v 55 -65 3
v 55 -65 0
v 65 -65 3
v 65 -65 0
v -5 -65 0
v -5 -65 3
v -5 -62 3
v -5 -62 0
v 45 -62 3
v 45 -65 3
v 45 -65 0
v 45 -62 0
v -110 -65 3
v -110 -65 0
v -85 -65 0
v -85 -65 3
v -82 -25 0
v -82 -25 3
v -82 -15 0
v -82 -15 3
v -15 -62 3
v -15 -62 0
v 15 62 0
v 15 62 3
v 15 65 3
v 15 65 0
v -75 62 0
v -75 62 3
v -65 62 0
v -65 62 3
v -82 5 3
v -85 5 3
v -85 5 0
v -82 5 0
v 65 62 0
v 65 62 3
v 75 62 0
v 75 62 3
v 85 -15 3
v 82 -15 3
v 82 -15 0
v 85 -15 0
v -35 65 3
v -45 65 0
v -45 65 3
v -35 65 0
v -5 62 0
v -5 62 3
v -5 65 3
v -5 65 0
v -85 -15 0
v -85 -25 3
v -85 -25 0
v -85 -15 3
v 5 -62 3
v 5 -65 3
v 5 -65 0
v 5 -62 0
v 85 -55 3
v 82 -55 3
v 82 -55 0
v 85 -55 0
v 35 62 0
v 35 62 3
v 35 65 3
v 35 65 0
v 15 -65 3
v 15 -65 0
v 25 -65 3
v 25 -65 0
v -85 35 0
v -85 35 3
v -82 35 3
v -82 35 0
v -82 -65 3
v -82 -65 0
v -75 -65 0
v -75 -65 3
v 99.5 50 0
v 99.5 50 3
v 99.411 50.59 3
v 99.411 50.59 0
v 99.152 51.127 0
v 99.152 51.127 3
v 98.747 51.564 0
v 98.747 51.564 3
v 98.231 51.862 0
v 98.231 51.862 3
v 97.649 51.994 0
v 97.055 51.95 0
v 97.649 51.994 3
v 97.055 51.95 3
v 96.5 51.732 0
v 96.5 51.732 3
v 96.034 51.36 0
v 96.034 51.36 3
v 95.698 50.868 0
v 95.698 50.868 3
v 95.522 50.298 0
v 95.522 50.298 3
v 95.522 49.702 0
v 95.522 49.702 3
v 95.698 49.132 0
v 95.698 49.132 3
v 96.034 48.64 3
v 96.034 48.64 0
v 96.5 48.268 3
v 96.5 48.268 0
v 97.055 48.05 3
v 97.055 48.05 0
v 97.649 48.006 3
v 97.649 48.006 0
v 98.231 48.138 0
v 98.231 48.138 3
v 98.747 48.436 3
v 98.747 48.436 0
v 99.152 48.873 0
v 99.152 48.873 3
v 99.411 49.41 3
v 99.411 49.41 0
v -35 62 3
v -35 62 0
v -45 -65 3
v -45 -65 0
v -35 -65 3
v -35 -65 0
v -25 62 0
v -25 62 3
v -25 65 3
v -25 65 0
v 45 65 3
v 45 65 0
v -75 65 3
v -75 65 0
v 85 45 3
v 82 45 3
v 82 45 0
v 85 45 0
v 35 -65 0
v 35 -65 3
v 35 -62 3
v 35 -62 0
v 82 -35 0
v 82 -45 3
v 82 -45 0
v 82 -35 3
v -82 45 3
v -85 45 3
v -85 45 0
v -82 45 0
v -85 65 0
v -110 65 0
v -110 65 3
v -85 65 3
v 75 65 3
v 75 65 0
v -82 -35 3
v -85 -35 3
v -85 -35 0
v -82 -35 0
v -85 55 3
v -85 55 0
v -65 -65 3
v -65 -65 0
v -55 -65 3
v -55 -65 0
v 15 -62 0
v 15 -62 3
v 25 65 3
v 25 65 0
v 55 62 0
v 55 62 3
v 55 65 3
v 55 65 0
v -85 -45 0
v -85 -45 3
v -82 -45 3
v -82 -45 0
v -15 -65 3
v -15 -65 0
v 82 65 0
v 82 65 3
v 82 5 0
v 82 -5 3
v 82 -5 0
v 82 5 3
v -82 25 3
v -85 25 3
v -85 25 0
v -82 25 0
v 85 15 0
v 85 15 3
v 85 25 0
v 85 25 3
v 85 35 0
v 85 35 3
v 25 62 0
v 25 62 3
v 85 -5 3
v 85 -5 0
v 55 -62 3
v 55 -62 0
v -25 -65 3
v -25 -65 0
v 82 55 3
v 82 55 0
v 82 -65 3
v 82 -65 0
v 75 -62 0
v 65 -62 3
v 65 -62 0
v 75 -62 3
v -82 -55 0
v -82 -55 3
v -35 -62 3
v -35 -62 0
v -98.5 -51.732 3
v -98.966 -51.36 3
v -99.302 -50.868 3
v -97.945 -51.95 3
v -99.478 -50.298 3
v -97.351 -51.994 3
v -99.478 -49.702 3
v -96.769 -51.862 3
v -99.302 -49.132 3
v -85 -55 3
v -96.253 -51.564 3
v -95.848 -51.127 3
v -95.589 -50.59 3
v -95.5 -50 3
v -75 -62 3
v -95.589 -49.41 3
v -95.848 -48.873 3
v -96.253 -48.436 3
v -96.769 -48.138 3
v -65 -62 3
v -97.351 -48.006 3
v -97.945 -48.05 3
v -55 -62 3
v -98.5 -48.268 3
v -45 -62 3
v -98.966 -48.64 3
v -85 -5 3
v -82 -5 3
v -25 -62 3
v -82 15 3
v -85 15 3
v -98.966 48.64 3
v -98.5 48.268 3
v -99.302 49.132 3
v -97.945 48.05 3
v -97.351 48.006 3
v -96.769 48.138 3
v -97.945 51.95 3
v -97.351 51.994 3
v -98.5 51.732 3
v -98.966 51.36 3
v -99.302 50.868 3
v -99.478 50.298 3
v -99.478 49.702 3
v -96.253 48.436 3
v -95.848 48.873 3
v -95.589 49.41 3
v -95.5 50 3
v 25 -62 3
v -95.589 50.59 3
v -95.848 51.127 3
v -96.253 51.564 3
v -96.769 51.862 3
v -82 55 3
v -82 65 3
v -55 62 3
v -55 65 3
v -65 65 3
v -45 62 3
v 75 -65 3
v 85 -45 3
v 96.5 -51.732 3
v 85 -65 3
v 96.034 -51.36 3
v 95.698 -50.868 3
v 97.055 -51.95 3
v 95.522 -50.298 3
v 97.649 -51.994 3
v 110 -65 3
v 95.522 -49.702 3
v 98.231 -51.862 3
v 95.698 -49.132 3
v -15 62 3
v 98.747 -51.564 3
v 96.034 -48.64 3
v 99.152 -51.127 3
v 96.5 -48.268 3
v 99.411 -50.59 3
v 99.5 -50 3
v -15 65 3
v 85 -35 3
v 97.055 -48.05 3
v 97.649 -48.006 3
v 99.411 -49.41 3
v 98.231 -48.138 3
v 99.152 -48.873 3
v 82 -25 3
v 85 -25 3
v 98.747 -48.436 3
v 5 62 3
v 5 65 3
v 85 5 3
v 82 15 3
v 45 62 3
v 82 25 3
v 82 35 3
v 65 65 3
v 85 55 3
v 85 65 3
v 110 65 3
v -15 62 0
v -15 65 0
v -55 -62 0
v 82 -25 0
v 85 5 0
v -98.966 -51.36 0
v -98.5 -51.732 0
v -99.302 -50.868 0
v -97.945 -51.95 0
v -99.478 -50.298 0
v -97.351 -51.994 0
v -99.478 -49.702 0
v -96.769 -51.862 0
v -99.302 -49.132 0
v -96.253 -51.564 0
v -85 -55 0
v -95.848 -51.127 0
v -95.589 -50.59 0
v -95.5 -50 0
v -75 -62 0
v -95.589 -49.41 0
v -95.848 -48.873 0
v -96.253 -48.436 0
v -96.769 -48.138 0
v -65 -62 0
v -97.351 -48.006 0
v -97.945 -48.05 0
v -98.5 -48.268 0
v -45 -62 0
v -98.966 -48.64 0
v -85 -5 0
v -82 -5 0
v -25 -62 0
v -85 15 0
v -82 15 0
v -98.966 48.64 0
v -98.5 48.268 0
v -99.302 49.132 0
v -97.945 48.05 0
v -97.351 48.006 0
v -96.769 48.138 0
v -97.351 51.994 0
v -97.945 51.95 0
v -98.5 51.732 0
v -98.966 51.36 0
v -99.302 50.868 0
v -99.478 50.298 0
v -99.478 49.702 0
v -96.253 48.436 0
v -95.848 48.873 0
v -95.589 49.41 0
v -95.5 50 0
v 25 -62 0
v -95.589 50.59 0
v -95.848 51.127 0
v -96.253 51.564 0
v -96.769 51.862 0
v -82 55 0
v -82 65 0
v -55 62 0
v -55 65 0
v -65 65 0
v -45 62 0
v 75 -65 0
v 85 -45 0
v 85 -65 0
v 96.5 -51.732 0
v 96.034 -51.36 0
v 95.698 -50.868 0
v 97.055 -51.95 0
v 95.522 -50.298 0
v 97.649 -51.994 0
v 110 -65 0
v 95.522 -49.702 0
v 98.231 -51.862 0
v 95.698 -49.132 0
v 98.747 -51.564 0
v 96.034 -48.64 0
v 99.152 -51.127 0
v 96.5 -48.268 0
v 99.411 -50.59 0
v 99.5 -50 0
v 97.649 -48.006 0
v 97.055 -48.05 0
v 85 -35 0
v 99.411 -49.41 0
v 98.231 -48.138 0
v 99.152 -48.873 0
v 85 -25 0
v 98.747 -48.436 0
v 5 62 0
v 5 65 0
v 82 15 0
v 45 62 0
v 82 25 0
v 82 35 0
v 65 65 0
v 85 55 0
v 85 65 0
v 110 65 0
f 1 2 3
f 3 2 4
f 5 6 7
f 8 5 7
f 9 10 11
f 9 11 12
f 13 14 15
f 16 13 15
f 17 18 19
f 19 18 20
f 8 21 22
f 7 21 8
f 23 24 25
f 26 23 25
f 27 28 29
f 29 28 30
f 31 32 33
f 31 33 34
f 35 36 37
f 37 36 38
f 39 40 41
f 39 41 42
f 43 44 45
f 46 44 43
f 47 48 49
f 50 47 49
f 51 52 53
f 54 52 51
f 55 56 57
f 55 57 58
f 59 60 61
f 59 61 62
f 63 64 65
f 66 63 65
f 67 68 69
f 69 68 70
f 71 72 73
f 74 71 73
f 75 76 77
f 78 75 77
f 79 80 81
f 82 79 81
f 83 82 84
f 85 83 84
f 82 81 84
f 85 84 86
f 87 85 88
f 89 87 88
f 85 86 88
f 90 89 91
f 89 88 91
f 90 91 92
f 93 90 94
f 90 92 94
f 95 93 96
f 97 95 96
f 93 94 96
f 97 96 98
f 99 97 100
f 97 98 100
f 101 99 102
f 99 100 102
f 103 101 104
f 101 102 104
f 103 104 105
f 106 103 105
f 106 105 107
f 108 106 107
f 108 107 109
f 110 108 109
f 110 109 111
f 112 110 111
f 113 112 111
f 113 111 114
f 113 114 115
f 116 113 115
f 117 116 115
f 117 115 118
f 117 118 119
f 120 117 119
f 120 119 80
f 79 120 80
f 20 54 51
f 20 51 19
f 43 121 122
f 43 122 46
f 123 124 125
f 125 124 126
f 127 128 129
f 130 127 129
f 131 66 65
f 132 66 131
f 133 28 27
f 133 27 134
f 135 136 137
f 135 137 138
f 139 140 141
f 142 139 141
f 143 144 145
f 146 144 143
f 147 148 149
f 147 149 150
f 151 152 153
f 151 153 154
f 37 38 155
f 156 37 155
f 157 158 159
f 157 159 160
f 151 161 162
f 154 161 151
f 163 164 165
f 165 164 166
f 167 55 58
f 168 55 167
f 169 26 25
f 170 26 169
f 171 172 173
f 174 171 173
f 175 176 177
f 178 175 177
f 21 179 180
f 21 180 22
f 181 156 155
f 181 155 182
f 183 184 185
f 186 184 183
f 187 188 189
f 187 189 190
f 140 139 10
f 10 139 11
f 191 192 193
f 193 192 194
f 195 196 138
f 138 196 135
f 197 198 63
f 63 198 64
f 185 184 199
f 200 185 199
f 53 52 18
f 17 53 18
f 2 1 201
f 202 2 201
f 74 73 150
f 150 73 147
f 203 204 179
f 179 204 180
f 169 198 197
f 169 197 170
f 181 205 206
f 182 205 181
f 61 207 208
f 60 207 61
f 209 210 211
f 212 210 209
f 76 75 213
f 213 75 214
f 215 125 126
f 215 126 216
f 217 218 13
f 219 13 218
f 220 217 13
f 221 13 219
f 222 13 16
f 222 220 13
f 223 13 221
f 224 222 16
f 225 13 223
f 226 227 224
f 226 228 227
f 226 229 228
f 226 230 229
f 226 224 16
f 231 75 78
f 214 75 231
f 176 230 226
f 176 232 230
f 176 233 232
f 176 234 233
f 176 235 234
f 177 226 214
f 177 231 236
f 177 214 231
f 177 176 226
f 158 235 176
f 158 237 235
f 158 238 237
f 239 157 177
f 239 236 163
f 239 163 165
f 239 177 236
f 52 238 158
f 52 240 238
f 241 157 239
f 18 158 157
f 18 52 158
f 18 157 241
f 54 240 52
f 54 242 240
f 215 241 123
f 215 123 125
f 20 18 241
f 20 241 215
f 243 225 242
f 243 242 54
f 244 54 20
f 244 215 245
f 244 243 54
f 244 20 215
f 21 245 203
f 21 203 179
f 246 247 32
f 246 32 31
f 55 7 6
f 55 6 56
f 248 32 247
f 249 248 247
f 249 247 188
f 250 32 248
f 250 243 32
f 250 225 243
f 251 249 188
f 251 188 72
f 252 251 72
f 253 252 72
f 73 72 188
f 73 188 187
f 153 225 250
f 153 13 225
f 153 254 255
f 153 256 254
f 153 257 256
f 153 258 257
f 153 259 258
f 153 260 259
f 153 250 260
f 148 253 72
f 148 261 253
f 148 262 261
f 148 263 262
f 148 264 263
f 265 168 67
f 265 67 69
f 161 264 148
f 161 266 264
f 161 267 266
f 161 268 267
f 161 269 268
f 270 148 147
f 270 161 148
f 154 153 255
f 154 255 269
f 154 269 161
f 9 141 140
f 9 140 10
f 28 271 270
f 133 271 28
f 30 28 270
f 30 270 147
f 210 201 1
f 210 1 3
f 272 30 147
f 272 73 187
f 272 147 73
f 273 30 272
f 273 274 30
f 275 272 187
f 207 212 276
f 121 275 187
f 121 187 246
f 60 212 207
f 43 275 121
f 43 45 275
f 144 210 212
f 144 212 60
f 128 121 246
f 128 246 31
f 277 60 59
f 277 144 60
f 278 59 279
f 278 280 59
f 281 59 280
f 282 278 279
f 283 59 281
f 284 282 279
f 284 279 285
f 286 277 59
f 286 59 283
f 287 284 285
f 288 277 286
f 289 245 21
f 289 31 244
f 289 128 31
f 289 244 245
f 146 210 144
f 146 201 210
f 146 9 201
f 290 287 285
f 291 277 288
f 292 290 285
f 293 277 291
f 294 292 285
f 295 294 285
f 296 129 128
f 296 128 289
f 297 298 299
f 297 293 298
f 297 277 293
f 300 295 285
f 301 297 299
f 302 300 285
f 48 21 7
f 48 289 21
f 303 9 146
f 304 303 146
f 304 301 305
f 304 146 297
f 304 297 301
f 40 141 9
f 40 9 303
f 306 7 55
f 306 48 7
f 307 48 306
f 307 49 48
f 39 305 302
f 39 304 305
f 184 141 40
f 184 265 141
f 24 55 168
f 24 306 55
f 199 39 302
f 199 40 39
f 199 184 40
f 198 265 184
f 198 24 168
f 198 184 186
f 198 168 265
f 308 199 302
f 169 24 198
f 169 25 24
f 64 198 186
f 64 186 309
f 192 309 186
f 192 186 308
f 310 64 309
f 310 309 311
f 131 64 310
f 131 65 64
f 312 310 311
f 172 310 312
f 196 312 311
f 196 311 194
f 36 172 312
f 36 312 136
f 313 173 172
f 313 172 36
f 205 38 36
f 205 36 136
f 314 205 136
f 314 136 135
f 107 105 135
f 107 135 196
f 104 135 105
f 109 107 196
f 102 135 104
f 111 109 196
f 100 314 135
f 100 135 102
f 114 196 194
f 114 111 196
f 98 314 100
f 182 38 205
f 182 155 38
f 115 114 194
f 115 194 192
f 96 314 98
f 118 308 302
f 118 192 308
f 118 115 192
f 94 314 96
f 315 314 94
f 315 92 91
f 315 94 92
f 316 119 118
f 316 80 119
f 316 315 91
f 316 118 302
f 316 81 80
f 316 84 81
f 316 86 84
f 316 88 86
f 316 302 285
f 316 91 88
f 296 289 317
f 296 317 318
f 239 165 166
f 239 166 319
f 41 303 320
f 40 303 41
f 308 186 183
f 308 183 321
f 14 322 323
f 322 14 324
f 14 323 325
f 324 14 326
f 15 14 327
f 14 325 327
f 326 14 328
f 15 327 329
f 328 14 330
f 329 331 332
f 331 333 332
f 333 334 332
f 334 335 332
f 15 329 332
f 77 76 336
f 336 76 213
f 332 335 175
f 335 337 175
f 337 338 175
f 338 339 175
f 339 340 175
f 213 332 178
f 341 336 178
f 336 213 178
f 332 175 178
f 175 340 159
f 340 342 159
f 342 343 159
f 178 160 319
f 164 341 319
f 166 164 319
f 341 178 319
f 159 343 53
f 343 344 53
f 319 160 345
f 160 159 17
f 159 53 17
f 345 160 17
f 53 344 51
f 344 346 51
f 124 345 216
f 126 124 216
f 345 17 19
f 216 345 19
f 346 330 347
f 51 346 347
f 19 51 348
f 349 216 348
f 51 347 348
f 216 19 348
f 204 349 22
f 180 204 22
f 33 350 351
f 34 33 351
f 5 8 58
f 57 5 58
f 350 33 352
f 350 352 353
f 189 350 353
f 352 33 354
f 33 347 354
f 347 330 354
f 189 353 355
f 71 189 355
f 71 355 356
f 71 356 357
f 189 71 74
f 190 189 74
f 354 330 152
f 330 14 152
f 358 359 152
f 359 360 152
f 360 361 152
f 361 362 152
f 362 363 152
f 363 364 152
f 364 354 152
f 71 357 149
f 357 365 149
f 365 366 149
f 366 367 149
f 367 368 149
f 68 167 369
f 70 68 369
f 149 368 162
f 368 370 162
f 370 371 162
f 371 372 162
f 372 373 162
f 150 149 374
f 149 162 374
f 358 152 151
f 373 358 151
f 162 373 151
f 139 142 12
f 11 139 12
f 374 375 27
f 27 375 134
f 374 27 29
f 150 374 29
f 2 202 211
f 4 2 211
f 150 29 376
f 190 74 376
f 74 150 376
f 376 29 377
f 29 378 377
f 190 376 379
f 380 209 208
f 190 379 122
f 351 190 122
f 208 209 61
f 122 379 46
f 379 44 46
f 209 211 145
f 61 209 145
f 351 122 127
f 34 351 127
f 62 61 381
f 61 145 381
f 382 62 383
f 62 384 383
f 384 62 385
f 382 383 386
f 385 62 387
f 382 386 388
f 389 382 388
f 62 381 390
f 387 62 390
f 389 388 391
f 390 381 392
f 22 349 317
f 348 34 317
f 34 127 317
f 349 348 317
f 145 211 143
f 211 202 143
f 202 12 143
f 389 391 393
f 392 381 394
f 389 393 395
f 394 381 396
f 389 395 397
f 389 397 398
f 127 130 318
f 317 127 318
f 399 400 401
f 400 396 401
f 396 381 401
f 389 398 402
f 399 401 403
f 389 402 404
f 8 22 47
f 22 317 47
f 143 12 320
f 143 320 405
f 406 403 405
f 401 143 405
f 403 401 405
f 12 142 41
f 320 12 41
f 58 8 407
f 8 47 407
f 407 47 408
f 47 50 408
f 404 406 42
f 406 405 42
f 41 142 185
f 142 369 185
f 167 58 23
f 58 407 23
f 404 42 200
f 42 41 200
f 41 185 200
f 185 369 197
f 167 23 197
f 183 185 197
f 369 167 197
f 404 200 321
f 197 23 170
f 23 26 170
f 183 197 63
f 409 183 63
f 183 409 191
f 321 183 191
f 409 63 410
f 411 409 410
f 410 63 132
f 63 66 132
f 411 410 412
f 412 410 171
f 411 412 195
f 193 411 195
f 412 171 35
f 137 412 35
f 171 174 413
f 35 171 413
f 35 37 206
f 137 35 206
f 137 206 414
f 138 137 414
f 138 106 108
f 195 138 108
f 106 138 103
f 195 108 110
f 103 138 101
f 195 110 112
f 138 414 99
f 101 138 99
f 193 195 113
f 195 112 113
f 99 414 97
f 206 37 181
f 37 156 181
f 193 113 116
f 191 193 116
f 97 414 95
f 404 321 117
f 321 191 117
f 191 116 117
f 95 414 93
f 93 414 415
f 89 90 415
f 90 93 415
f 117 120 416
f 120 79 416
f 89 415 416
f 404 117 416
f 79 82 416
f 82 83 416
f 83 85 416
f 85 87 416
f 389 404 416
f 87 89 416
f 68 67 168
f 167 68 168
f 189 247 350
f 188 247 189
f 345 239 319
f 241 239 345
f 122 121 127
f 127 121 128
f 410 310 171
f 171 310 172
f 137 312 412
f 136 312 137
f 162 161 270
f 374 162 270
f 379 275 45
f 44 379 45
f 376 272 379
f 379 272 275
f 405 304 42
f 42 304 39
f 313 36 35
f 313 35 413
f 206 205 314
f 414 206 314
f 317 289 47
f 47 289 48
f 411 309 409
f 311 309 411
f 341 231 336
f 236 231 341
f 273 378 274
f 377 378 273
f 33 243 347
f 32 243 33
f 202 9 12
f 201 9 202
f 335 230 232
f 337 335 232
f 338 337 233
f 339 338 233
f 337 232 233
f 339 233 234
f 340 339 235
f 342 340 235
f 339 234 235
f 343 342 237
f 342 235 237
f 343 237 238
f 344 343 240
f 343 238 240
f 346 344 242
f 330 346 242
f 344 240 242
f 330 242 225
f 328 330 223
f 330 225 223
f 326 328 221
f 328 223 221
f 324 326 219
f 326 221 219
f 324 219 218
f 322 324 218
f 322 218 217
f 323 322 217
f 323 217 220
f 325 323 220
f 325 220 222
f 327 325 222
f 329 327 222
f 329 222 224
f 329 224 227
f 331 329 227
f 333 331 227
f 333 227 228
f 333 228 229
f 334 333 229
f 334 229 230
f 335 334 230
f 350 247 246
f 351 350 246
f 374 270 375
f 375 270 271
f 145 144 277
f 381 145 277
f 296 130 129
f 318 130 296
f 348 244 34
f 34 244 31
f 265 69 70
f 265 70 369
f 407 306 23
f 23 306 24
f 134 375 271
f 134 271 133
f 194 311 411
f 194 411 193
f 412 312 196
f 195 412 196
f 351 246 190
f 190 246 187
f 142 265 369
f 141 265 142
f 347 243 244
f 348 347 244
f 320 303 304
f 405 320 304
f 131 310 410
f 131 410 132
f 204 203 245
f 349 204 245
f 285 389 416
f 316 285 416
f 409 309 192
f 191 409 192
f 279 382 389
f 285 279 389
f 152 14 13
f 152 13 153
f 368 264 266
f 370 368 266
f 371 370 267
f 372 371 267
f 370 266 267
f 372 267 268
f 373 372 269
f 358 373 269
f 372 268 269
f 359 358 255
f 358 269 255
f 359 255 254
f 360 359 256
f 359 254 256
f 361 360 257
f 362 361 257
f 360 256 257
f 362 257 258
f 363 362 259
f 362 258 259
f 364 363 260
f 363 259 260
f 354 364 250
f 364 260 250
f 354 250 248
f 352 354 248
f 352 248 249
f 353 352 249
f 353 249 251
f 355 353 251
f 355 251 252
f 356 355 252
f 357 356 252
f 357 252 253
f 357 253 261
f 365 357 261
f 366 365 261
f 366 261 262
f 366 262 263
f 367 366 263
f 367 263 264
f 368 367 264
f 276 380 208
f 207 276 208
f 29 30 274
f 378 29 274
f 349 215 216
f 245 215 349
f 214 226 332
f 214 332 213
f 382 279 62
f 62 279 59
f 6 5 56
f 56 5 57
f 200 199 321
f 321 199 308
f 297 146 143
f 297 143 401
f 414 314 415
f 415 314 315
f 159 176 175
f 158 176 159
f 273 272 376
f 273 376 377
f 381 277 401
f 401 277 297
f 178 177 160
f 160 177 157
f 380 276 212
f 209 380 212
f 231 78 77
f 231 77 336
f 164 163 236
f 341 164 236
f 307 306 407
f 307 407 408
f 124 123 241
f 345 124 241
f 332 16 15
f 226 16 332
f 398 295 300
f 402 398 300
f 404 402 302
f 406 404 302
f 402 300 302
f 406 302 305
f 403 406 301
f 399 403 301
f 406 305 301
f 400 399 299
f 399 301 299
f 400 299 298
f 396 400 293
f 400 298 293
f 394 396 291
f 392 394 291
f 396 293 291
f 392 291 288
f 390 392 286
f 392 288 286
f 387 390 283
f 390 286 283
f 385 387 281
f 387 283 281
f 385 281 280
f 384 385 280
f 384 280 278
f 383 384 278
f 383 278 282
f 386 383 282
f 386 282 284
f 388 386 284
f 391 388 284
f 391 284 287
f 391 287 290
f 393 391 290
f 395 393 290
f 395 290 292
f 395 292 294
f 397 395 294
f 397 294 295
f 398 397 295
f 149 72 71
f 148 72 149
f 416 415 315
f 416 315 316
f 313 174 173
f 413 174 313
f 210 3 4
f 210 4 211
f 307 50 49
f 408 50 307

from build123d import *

# Parameters (mm, degrees)
F0_W     = 220
F0_H     = 130
F1_DEPTH = 3
F2_W     = 10
F2_H     = 3
F2_W_2   = 3
F2_H_2   = 10
F3_DEPTH = 3.001
F4_R     = 2
F5_DEPTH = 3.001


with BuildPart() as f1:
    # F0 (on Top) → F1 (new body)
    with BuildSketch(Plane.XY):
        Rectangle(F0_W, F0_H)
    extrude(amount=F1_DEPTH)

    # F2 (on face) → F3 (cut, through all)
    with BuildSketch(Plane.XY.offset(3)):
        with Locations((-70, -63.5)):
            Rectangle(F2_W, F2_H)
        with Locations((-50, -63.5)):
            Rectangle(F2_W, F2_H)
        with Locations((-30, -63.5)):
            Rectangle(F2_W, F2_H)
        with Locations((-10, -63.5)):
            Rectangle(F2_W, F2_H)
        with Locations((10, -63.5)):
            Rectangle(F2_W, F2_H)
        with Locations((30, -63.5)):
            Rectangle(F2_W, F2_H)
        with Locations((50, -63.5)):
            Rectangle(F2_W, F2_H)
        with Locations((70, -63.5)):
            Rectangle(F2_W, F2_H)
        with Locations((-83.5, -60)):
            Rectangle(F2_W_2, F2_H_2)
        with Locations((-83.5, -40)):
            Rectangle(F2_W_2, F2_H_2)
        with Locations((-83.5, -20)):
            Rectangle(F2_W_2, F2_H_2)
        with Locations((-83.5, 0)):
            Rectangle(F2_W_2, F2_H_2)
        with Locations((-83.5, 20)):
            Rectangle(F2_W_2, F2_H_2)
        with Locations((-83.5, 40)):
            Rectangle(F2_W_2, F2_H_2)
        with Locations((-83.5, 60)):
            Rectangle(F2_W_2, F2_H_2)
        with Locations((-50, 63.5)):
            Rectangle(F2_W, F2_H)
        with Locations((30, 63.5)):
            Rectangle(F2_W, F2_H)
        with Locations((-70, 63.5)):
            Rectangle(F2_W, F2_H)
        with Locations((70, 63.5)):
            Rectangle(F2_W, F2_H)
        with Locations((-10, 63.5)):
            Rectangle(F2_W, F2_H)
        with Locations((-30, 63.5)):
            Rectangle(F2_W, F2_H)
        with Locations((50, 63.5)):
            Rectangle(F2_W, F2_H)
        with Locations((10, 63.5)):
            Rectangle(F2_W, F2_H)
        with Locations((83.5, -40)):
            Rectangle(F2_W_2, F2_H_2)
        with Locations((83.5, -20)):
            Rectangle(F2_W_2, F2_H_2)
        with Locations((83.5, 40)):
            Rectangle(F2_W_2, F2_H_2)
        with Locations((83.5, 60)):
            Rectangle(F2_W_2, F2_H_2)
        with Locations((83.5, 20)):
            Rectangle(F2_W_2, F2_H_2)
        with Locations((83.5, -60)):
            Rectangle(F2_W_2, F2_H_2)
        with Locations((83.5, 0)):
            Rectangle(F2_W_2, F2_H_2)
    extrude(amount=-F3_DEPTH, mode=Mode.SUBTRACT)

    # F4 (on face) → F5 (cut, through all)
    with BuildSketch(Plane.XY.offset(3)):
        with Locations((97.5, 50)):
            Circle(F4_R)
        with Locations((97.5, -50)):
            Circle(F4_R)
        with Locations((-97.5, 50)):
            Circle(F4_R)
        with Locations((-97.5, -50)):
            Circle(F4_R)
    extrude(amount=-F5_DEPTH, mode=Mode.SUBTRACT)


solid = f1.part
